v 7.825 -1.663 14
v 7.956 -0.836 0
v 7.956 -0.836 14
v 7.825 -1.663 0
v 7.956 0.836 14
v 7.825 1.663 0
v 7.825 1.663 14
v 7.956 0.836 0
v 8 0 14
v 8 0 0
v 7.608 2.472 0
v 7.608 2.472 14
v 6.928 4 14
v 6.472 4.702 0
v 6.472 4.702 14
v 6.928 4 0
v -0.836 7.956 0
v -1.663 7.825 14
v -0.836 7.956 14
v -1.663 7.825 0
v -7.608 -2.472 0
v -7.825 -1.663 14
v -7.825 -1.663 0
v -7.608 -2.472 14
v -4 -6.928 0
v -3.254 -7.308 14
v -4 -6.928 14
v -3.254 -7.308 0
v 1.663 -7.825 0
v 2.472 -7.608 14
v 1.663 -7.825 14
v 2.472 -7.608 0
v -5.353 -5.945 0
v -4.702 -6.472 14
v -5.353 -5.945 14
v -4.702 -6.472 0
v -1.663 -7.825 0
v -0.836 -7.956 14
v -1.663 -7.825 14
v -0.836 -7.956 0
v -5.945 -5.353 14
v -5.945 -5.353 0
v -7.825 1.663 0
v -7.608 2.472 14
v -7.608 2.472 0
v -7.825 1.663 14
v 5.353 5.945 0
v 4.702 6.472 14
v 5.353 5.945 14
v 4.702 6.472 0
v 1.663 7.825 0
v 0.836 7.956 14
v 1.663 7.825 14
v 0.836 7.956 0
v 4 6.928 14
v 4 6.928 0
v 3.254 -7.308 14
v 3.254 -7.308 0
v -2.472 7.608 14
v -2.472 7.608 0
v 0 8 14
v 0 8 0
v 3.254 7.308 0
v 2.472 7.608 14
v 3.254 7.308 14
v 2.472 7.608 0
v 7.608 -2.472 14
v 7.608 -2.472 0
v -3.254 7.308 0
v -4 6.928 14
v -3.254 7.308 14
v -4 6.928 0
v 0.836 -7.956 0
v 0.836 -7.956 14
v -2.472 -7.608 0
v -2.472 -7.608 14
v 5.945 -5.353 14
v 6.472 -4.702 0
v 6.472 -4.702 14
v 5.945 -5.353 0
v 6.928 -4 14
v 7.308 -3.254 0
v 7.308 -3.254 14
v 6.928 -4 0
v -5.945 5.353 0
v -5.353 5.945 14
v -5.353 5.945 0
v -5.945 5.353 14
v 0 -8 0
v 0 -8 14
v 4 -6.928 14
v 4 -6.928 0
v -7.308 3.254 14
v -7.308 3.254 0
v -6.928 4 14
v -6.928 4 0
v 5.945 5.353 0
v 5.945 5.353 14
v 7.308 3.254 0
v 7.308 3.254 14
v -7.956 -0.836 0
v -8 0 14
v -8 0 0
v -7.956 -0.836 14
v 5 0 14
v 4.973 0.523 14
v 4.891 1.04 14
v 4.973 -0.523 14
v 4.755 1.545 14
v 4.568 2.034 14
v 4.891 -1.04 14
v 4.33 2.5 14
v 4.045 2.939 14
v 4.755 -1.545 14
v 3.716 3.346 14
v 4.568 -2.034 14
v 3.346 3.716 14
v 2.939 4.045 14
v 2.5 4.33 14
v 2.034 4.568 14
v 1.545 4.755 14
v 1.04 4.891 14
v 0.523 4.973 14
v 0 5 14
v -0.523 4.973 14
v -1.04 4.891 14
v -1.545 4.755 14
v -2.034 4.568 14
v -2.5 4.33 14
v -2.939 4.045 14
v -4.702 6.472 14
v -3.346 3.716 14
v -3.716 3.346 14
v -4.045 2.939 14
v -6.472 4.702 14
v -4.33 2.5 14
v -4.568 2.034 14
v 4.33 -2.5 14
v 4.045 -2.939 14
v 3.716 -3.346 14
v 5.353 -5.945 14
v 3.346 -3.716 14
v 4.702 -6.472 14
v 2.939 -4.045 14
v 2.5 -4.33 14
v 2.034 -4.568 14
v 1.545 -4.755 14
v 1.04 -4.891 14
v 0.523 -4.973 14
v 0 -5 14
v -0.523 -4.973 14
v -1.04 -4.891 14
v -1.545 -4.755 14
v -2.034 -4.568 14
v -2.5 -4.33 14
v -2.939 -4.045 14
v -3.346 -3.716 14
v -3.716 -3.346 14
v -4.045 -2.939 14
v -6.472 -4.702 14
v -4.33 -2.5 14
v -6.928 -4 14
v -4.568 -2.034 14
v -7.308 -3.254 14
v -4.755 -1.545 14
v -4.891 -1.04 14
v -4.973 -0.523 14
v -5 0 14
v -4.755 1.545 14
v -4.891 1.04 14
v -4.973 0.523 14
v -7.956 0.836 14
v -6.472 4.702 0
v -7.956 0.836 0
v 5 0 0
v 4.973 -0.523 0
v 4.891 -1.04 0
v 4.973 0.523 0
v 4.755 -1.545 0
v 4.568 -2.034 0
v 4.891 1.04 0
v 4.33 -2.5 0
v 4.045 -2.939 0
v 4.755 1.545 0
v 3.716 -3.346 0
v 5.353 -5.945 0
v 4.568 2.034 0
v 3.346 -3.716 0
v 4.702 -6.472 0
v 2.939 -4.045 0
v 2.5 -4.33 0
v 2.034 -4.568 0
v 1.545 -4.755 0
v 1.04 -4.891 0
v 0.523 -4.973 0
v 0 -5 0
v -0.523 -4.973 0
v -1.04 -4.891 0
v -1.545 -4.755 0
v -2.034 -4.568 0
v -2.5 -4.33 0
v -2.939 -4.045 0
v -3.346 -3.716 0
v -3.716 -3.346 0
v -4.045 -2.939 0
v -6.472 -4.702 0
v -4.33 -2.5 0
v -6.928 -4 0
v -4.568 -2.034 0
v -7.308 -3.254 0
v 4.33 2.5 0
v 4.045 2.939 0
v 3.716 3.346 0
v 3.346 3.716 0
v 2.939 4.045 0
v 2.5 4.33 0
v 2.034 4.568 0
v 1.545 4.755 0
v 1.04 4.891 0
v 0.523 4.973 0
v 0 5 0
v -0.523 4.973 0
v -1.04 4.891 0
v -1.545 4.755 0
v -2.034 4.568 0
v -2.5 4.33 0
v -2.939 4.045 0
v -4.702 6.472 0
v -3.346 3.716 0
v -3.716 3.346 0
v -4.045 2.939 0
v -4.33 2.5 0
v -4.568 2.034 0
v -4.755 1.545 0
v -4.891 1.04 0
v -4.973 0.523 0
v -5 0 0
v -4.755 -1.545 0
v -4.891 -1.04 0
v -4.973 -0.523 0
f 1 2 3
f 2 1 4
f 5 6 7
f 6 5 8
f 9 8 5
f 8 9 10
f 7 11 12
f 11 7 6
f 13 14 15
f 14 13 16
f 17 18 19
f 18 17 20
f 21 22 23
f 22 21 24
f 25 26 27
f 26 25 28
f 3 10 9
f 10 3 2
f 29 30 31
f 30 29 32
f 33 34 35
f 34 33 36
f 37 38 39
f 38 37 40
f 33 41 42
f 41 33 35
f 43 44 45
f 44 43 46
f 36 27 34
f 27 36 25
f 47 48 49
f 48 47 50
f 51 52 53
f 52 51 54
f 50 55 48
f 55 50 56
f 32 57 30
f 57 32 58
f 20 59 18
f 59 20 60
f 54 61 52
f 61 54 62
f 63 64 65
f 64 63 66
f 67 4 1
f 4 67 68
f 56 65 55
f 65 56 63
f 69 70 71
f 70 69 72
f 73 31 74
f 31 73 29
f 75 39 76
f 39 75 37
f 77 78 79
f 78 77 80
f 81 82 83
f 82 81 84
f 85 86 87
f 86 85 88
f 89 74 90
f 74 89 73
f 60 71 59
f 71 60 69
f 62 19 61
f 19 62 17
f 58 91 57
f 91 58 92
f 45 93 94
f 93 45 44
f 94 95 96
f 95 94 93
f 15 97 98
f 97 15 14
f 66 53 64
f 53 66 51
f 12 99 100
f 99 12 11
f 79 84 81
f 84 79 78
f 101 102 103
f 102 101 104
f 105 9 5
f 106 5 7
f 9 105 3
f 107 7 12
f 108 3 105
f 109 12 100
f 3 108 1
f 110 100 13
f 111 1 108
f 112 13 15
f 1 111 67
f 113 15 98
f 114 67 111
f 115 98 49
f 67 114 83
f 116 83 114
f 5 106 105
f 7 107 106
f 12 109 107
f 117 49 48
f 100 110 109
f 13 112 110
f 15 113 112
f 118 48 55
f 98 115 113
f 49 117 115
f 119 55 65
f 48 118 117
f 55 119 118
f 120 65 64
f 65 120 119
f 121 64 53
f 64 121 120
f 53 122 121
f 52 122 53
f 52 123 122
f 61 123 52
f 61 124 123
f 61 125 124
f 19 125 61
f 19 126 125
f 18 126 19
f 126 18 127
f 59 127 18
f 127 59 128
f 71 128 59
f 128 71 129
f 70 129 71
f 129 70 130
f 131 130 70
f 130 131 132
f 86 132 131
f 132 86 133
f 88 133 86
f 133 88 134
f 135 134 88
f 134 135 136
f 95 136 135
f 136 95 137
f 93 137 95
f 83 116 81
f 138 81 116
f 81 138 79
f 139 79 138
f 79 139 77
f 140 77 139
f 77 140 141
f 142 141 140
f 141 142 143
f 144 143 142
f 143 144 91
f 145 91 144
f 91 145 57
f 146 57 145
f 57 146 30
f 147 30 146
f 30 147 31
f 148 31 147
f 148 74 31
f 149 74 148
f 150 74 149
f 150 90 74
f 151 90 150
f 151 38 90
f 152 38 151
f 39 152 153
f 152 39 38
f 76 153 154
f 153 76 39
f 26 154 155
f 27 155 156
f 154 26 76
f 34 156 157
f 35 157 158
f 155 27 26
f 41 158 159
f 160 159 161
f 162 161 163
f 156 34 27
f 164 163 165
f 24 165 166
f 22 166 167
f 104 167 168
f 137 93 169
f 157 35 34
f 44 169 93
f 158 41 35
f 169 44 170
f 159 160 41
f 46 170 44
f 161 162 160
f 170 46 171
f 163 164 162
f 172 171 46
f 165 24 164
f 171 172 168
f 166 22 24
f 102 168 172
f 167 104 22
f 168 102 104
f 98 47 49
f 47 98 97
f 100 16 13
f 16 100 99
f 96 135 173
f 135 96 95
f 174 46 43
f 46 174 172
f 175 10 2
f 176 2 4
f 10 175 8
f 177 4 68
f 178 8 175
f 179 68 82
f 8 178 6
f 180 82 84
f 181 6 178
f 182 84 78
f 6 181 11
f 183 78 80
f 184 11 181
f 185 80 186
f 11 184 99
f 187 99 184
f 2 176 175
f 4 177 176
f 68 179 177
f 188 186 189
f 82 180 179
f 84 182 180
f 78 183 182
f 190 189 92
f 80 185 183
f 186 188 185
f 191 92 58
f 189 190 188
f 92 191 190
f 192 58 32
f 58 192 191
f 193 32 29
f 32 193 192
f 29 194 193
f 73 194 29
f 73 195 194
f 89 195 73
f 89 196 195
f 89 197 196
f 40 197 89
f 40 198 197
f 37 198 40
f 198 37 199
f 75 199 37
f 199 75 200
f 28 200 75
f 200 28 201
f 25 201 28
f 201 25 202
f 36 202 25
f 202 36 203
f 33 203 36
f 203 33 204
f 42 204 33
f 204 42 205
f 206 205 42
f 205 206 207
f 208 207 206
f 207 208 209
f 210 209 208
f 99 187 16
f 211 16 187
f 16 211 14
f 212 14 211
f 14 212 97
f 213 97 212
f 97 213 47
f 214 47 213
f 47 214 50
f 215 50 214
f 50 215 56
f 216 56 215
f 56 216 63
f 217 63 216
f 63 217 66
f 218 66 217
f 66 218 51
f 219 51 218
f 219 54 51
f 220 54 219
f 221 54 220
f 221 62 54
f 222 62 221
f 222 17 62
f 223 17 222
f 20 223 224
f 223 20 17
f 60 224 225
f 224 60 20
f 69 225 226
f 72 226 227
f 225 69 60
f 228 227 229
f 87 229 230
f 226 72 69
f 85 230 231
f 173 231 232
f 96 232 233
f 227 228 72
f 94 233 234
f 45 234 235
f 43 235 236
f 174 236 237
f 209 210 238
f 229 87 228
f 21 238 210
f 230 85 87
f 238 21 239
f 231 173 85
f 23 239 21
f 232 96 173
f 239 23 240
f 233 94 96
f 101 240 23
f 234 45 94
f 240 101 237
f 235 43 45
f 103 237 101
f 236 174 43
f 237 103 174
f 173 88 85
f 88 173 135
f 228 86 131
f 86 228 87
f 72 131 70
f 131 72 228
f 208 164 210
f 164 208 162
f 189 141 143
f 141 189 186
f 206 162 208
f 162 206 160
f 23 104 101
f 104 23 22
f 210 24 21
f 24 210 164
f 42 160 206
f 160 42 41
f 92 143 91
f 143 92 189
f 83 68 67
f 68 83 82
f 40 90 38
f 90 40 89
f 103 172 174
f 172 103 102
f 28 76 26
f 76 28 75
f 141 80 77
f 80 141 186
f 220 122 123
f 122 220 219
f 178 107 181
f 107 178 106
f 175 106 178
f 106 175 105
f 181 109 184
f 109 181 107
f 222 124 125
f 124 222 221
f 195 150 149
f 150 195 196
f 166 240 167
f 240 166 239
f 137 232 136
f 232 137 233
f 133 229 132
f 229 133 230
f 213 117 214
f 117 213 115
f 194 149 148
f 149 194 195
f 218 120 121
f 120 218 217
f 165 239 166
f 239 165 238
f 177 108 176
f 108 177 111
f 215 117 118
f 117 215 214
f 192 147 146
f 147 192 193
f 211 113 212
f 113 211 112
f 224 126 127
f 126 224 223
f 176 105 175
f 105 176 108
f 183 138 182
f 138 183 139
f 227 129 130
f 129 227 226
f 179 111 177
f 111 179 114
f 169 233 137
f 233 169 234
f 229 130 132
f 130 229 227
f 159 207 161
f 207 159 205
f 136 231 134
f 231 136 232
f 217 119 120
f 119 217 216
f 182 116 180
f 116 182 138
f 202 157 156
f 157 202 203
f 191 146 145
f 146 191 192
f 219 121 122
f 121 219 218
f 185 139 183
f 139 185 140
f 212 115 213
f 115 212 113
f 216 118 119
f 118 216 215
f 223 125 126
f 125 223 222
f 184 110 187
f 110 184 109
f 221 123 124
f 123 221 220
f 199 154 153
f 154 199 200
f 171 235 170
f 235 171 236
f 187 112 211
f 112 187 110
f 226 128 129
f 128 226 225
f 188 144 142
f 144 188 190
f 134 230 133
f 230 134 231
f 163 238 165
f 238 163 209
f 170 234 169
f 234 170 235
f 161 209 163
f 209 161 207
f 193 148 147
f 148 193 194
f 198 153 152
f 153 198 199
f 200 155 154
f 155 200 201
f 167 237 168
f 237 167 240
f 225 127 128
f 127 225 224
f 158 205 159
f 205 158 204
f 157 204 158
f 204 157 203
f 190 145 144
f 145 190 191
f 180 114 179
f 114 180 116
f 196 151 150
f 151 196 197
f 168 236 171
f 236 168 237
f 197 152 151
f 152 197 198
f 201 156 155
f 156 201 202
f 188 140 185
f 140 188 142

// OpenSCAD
// Axle spacer tube.
$fn = 60;
eps = 0.02;
inner_d = 10;
outer_d = 16;
length = 14;
difference() { cylinder(d = outer_d, h = length); translate([0,0,-eps]) cylinder(d = inner_d, h = length + 2 * eps); }
